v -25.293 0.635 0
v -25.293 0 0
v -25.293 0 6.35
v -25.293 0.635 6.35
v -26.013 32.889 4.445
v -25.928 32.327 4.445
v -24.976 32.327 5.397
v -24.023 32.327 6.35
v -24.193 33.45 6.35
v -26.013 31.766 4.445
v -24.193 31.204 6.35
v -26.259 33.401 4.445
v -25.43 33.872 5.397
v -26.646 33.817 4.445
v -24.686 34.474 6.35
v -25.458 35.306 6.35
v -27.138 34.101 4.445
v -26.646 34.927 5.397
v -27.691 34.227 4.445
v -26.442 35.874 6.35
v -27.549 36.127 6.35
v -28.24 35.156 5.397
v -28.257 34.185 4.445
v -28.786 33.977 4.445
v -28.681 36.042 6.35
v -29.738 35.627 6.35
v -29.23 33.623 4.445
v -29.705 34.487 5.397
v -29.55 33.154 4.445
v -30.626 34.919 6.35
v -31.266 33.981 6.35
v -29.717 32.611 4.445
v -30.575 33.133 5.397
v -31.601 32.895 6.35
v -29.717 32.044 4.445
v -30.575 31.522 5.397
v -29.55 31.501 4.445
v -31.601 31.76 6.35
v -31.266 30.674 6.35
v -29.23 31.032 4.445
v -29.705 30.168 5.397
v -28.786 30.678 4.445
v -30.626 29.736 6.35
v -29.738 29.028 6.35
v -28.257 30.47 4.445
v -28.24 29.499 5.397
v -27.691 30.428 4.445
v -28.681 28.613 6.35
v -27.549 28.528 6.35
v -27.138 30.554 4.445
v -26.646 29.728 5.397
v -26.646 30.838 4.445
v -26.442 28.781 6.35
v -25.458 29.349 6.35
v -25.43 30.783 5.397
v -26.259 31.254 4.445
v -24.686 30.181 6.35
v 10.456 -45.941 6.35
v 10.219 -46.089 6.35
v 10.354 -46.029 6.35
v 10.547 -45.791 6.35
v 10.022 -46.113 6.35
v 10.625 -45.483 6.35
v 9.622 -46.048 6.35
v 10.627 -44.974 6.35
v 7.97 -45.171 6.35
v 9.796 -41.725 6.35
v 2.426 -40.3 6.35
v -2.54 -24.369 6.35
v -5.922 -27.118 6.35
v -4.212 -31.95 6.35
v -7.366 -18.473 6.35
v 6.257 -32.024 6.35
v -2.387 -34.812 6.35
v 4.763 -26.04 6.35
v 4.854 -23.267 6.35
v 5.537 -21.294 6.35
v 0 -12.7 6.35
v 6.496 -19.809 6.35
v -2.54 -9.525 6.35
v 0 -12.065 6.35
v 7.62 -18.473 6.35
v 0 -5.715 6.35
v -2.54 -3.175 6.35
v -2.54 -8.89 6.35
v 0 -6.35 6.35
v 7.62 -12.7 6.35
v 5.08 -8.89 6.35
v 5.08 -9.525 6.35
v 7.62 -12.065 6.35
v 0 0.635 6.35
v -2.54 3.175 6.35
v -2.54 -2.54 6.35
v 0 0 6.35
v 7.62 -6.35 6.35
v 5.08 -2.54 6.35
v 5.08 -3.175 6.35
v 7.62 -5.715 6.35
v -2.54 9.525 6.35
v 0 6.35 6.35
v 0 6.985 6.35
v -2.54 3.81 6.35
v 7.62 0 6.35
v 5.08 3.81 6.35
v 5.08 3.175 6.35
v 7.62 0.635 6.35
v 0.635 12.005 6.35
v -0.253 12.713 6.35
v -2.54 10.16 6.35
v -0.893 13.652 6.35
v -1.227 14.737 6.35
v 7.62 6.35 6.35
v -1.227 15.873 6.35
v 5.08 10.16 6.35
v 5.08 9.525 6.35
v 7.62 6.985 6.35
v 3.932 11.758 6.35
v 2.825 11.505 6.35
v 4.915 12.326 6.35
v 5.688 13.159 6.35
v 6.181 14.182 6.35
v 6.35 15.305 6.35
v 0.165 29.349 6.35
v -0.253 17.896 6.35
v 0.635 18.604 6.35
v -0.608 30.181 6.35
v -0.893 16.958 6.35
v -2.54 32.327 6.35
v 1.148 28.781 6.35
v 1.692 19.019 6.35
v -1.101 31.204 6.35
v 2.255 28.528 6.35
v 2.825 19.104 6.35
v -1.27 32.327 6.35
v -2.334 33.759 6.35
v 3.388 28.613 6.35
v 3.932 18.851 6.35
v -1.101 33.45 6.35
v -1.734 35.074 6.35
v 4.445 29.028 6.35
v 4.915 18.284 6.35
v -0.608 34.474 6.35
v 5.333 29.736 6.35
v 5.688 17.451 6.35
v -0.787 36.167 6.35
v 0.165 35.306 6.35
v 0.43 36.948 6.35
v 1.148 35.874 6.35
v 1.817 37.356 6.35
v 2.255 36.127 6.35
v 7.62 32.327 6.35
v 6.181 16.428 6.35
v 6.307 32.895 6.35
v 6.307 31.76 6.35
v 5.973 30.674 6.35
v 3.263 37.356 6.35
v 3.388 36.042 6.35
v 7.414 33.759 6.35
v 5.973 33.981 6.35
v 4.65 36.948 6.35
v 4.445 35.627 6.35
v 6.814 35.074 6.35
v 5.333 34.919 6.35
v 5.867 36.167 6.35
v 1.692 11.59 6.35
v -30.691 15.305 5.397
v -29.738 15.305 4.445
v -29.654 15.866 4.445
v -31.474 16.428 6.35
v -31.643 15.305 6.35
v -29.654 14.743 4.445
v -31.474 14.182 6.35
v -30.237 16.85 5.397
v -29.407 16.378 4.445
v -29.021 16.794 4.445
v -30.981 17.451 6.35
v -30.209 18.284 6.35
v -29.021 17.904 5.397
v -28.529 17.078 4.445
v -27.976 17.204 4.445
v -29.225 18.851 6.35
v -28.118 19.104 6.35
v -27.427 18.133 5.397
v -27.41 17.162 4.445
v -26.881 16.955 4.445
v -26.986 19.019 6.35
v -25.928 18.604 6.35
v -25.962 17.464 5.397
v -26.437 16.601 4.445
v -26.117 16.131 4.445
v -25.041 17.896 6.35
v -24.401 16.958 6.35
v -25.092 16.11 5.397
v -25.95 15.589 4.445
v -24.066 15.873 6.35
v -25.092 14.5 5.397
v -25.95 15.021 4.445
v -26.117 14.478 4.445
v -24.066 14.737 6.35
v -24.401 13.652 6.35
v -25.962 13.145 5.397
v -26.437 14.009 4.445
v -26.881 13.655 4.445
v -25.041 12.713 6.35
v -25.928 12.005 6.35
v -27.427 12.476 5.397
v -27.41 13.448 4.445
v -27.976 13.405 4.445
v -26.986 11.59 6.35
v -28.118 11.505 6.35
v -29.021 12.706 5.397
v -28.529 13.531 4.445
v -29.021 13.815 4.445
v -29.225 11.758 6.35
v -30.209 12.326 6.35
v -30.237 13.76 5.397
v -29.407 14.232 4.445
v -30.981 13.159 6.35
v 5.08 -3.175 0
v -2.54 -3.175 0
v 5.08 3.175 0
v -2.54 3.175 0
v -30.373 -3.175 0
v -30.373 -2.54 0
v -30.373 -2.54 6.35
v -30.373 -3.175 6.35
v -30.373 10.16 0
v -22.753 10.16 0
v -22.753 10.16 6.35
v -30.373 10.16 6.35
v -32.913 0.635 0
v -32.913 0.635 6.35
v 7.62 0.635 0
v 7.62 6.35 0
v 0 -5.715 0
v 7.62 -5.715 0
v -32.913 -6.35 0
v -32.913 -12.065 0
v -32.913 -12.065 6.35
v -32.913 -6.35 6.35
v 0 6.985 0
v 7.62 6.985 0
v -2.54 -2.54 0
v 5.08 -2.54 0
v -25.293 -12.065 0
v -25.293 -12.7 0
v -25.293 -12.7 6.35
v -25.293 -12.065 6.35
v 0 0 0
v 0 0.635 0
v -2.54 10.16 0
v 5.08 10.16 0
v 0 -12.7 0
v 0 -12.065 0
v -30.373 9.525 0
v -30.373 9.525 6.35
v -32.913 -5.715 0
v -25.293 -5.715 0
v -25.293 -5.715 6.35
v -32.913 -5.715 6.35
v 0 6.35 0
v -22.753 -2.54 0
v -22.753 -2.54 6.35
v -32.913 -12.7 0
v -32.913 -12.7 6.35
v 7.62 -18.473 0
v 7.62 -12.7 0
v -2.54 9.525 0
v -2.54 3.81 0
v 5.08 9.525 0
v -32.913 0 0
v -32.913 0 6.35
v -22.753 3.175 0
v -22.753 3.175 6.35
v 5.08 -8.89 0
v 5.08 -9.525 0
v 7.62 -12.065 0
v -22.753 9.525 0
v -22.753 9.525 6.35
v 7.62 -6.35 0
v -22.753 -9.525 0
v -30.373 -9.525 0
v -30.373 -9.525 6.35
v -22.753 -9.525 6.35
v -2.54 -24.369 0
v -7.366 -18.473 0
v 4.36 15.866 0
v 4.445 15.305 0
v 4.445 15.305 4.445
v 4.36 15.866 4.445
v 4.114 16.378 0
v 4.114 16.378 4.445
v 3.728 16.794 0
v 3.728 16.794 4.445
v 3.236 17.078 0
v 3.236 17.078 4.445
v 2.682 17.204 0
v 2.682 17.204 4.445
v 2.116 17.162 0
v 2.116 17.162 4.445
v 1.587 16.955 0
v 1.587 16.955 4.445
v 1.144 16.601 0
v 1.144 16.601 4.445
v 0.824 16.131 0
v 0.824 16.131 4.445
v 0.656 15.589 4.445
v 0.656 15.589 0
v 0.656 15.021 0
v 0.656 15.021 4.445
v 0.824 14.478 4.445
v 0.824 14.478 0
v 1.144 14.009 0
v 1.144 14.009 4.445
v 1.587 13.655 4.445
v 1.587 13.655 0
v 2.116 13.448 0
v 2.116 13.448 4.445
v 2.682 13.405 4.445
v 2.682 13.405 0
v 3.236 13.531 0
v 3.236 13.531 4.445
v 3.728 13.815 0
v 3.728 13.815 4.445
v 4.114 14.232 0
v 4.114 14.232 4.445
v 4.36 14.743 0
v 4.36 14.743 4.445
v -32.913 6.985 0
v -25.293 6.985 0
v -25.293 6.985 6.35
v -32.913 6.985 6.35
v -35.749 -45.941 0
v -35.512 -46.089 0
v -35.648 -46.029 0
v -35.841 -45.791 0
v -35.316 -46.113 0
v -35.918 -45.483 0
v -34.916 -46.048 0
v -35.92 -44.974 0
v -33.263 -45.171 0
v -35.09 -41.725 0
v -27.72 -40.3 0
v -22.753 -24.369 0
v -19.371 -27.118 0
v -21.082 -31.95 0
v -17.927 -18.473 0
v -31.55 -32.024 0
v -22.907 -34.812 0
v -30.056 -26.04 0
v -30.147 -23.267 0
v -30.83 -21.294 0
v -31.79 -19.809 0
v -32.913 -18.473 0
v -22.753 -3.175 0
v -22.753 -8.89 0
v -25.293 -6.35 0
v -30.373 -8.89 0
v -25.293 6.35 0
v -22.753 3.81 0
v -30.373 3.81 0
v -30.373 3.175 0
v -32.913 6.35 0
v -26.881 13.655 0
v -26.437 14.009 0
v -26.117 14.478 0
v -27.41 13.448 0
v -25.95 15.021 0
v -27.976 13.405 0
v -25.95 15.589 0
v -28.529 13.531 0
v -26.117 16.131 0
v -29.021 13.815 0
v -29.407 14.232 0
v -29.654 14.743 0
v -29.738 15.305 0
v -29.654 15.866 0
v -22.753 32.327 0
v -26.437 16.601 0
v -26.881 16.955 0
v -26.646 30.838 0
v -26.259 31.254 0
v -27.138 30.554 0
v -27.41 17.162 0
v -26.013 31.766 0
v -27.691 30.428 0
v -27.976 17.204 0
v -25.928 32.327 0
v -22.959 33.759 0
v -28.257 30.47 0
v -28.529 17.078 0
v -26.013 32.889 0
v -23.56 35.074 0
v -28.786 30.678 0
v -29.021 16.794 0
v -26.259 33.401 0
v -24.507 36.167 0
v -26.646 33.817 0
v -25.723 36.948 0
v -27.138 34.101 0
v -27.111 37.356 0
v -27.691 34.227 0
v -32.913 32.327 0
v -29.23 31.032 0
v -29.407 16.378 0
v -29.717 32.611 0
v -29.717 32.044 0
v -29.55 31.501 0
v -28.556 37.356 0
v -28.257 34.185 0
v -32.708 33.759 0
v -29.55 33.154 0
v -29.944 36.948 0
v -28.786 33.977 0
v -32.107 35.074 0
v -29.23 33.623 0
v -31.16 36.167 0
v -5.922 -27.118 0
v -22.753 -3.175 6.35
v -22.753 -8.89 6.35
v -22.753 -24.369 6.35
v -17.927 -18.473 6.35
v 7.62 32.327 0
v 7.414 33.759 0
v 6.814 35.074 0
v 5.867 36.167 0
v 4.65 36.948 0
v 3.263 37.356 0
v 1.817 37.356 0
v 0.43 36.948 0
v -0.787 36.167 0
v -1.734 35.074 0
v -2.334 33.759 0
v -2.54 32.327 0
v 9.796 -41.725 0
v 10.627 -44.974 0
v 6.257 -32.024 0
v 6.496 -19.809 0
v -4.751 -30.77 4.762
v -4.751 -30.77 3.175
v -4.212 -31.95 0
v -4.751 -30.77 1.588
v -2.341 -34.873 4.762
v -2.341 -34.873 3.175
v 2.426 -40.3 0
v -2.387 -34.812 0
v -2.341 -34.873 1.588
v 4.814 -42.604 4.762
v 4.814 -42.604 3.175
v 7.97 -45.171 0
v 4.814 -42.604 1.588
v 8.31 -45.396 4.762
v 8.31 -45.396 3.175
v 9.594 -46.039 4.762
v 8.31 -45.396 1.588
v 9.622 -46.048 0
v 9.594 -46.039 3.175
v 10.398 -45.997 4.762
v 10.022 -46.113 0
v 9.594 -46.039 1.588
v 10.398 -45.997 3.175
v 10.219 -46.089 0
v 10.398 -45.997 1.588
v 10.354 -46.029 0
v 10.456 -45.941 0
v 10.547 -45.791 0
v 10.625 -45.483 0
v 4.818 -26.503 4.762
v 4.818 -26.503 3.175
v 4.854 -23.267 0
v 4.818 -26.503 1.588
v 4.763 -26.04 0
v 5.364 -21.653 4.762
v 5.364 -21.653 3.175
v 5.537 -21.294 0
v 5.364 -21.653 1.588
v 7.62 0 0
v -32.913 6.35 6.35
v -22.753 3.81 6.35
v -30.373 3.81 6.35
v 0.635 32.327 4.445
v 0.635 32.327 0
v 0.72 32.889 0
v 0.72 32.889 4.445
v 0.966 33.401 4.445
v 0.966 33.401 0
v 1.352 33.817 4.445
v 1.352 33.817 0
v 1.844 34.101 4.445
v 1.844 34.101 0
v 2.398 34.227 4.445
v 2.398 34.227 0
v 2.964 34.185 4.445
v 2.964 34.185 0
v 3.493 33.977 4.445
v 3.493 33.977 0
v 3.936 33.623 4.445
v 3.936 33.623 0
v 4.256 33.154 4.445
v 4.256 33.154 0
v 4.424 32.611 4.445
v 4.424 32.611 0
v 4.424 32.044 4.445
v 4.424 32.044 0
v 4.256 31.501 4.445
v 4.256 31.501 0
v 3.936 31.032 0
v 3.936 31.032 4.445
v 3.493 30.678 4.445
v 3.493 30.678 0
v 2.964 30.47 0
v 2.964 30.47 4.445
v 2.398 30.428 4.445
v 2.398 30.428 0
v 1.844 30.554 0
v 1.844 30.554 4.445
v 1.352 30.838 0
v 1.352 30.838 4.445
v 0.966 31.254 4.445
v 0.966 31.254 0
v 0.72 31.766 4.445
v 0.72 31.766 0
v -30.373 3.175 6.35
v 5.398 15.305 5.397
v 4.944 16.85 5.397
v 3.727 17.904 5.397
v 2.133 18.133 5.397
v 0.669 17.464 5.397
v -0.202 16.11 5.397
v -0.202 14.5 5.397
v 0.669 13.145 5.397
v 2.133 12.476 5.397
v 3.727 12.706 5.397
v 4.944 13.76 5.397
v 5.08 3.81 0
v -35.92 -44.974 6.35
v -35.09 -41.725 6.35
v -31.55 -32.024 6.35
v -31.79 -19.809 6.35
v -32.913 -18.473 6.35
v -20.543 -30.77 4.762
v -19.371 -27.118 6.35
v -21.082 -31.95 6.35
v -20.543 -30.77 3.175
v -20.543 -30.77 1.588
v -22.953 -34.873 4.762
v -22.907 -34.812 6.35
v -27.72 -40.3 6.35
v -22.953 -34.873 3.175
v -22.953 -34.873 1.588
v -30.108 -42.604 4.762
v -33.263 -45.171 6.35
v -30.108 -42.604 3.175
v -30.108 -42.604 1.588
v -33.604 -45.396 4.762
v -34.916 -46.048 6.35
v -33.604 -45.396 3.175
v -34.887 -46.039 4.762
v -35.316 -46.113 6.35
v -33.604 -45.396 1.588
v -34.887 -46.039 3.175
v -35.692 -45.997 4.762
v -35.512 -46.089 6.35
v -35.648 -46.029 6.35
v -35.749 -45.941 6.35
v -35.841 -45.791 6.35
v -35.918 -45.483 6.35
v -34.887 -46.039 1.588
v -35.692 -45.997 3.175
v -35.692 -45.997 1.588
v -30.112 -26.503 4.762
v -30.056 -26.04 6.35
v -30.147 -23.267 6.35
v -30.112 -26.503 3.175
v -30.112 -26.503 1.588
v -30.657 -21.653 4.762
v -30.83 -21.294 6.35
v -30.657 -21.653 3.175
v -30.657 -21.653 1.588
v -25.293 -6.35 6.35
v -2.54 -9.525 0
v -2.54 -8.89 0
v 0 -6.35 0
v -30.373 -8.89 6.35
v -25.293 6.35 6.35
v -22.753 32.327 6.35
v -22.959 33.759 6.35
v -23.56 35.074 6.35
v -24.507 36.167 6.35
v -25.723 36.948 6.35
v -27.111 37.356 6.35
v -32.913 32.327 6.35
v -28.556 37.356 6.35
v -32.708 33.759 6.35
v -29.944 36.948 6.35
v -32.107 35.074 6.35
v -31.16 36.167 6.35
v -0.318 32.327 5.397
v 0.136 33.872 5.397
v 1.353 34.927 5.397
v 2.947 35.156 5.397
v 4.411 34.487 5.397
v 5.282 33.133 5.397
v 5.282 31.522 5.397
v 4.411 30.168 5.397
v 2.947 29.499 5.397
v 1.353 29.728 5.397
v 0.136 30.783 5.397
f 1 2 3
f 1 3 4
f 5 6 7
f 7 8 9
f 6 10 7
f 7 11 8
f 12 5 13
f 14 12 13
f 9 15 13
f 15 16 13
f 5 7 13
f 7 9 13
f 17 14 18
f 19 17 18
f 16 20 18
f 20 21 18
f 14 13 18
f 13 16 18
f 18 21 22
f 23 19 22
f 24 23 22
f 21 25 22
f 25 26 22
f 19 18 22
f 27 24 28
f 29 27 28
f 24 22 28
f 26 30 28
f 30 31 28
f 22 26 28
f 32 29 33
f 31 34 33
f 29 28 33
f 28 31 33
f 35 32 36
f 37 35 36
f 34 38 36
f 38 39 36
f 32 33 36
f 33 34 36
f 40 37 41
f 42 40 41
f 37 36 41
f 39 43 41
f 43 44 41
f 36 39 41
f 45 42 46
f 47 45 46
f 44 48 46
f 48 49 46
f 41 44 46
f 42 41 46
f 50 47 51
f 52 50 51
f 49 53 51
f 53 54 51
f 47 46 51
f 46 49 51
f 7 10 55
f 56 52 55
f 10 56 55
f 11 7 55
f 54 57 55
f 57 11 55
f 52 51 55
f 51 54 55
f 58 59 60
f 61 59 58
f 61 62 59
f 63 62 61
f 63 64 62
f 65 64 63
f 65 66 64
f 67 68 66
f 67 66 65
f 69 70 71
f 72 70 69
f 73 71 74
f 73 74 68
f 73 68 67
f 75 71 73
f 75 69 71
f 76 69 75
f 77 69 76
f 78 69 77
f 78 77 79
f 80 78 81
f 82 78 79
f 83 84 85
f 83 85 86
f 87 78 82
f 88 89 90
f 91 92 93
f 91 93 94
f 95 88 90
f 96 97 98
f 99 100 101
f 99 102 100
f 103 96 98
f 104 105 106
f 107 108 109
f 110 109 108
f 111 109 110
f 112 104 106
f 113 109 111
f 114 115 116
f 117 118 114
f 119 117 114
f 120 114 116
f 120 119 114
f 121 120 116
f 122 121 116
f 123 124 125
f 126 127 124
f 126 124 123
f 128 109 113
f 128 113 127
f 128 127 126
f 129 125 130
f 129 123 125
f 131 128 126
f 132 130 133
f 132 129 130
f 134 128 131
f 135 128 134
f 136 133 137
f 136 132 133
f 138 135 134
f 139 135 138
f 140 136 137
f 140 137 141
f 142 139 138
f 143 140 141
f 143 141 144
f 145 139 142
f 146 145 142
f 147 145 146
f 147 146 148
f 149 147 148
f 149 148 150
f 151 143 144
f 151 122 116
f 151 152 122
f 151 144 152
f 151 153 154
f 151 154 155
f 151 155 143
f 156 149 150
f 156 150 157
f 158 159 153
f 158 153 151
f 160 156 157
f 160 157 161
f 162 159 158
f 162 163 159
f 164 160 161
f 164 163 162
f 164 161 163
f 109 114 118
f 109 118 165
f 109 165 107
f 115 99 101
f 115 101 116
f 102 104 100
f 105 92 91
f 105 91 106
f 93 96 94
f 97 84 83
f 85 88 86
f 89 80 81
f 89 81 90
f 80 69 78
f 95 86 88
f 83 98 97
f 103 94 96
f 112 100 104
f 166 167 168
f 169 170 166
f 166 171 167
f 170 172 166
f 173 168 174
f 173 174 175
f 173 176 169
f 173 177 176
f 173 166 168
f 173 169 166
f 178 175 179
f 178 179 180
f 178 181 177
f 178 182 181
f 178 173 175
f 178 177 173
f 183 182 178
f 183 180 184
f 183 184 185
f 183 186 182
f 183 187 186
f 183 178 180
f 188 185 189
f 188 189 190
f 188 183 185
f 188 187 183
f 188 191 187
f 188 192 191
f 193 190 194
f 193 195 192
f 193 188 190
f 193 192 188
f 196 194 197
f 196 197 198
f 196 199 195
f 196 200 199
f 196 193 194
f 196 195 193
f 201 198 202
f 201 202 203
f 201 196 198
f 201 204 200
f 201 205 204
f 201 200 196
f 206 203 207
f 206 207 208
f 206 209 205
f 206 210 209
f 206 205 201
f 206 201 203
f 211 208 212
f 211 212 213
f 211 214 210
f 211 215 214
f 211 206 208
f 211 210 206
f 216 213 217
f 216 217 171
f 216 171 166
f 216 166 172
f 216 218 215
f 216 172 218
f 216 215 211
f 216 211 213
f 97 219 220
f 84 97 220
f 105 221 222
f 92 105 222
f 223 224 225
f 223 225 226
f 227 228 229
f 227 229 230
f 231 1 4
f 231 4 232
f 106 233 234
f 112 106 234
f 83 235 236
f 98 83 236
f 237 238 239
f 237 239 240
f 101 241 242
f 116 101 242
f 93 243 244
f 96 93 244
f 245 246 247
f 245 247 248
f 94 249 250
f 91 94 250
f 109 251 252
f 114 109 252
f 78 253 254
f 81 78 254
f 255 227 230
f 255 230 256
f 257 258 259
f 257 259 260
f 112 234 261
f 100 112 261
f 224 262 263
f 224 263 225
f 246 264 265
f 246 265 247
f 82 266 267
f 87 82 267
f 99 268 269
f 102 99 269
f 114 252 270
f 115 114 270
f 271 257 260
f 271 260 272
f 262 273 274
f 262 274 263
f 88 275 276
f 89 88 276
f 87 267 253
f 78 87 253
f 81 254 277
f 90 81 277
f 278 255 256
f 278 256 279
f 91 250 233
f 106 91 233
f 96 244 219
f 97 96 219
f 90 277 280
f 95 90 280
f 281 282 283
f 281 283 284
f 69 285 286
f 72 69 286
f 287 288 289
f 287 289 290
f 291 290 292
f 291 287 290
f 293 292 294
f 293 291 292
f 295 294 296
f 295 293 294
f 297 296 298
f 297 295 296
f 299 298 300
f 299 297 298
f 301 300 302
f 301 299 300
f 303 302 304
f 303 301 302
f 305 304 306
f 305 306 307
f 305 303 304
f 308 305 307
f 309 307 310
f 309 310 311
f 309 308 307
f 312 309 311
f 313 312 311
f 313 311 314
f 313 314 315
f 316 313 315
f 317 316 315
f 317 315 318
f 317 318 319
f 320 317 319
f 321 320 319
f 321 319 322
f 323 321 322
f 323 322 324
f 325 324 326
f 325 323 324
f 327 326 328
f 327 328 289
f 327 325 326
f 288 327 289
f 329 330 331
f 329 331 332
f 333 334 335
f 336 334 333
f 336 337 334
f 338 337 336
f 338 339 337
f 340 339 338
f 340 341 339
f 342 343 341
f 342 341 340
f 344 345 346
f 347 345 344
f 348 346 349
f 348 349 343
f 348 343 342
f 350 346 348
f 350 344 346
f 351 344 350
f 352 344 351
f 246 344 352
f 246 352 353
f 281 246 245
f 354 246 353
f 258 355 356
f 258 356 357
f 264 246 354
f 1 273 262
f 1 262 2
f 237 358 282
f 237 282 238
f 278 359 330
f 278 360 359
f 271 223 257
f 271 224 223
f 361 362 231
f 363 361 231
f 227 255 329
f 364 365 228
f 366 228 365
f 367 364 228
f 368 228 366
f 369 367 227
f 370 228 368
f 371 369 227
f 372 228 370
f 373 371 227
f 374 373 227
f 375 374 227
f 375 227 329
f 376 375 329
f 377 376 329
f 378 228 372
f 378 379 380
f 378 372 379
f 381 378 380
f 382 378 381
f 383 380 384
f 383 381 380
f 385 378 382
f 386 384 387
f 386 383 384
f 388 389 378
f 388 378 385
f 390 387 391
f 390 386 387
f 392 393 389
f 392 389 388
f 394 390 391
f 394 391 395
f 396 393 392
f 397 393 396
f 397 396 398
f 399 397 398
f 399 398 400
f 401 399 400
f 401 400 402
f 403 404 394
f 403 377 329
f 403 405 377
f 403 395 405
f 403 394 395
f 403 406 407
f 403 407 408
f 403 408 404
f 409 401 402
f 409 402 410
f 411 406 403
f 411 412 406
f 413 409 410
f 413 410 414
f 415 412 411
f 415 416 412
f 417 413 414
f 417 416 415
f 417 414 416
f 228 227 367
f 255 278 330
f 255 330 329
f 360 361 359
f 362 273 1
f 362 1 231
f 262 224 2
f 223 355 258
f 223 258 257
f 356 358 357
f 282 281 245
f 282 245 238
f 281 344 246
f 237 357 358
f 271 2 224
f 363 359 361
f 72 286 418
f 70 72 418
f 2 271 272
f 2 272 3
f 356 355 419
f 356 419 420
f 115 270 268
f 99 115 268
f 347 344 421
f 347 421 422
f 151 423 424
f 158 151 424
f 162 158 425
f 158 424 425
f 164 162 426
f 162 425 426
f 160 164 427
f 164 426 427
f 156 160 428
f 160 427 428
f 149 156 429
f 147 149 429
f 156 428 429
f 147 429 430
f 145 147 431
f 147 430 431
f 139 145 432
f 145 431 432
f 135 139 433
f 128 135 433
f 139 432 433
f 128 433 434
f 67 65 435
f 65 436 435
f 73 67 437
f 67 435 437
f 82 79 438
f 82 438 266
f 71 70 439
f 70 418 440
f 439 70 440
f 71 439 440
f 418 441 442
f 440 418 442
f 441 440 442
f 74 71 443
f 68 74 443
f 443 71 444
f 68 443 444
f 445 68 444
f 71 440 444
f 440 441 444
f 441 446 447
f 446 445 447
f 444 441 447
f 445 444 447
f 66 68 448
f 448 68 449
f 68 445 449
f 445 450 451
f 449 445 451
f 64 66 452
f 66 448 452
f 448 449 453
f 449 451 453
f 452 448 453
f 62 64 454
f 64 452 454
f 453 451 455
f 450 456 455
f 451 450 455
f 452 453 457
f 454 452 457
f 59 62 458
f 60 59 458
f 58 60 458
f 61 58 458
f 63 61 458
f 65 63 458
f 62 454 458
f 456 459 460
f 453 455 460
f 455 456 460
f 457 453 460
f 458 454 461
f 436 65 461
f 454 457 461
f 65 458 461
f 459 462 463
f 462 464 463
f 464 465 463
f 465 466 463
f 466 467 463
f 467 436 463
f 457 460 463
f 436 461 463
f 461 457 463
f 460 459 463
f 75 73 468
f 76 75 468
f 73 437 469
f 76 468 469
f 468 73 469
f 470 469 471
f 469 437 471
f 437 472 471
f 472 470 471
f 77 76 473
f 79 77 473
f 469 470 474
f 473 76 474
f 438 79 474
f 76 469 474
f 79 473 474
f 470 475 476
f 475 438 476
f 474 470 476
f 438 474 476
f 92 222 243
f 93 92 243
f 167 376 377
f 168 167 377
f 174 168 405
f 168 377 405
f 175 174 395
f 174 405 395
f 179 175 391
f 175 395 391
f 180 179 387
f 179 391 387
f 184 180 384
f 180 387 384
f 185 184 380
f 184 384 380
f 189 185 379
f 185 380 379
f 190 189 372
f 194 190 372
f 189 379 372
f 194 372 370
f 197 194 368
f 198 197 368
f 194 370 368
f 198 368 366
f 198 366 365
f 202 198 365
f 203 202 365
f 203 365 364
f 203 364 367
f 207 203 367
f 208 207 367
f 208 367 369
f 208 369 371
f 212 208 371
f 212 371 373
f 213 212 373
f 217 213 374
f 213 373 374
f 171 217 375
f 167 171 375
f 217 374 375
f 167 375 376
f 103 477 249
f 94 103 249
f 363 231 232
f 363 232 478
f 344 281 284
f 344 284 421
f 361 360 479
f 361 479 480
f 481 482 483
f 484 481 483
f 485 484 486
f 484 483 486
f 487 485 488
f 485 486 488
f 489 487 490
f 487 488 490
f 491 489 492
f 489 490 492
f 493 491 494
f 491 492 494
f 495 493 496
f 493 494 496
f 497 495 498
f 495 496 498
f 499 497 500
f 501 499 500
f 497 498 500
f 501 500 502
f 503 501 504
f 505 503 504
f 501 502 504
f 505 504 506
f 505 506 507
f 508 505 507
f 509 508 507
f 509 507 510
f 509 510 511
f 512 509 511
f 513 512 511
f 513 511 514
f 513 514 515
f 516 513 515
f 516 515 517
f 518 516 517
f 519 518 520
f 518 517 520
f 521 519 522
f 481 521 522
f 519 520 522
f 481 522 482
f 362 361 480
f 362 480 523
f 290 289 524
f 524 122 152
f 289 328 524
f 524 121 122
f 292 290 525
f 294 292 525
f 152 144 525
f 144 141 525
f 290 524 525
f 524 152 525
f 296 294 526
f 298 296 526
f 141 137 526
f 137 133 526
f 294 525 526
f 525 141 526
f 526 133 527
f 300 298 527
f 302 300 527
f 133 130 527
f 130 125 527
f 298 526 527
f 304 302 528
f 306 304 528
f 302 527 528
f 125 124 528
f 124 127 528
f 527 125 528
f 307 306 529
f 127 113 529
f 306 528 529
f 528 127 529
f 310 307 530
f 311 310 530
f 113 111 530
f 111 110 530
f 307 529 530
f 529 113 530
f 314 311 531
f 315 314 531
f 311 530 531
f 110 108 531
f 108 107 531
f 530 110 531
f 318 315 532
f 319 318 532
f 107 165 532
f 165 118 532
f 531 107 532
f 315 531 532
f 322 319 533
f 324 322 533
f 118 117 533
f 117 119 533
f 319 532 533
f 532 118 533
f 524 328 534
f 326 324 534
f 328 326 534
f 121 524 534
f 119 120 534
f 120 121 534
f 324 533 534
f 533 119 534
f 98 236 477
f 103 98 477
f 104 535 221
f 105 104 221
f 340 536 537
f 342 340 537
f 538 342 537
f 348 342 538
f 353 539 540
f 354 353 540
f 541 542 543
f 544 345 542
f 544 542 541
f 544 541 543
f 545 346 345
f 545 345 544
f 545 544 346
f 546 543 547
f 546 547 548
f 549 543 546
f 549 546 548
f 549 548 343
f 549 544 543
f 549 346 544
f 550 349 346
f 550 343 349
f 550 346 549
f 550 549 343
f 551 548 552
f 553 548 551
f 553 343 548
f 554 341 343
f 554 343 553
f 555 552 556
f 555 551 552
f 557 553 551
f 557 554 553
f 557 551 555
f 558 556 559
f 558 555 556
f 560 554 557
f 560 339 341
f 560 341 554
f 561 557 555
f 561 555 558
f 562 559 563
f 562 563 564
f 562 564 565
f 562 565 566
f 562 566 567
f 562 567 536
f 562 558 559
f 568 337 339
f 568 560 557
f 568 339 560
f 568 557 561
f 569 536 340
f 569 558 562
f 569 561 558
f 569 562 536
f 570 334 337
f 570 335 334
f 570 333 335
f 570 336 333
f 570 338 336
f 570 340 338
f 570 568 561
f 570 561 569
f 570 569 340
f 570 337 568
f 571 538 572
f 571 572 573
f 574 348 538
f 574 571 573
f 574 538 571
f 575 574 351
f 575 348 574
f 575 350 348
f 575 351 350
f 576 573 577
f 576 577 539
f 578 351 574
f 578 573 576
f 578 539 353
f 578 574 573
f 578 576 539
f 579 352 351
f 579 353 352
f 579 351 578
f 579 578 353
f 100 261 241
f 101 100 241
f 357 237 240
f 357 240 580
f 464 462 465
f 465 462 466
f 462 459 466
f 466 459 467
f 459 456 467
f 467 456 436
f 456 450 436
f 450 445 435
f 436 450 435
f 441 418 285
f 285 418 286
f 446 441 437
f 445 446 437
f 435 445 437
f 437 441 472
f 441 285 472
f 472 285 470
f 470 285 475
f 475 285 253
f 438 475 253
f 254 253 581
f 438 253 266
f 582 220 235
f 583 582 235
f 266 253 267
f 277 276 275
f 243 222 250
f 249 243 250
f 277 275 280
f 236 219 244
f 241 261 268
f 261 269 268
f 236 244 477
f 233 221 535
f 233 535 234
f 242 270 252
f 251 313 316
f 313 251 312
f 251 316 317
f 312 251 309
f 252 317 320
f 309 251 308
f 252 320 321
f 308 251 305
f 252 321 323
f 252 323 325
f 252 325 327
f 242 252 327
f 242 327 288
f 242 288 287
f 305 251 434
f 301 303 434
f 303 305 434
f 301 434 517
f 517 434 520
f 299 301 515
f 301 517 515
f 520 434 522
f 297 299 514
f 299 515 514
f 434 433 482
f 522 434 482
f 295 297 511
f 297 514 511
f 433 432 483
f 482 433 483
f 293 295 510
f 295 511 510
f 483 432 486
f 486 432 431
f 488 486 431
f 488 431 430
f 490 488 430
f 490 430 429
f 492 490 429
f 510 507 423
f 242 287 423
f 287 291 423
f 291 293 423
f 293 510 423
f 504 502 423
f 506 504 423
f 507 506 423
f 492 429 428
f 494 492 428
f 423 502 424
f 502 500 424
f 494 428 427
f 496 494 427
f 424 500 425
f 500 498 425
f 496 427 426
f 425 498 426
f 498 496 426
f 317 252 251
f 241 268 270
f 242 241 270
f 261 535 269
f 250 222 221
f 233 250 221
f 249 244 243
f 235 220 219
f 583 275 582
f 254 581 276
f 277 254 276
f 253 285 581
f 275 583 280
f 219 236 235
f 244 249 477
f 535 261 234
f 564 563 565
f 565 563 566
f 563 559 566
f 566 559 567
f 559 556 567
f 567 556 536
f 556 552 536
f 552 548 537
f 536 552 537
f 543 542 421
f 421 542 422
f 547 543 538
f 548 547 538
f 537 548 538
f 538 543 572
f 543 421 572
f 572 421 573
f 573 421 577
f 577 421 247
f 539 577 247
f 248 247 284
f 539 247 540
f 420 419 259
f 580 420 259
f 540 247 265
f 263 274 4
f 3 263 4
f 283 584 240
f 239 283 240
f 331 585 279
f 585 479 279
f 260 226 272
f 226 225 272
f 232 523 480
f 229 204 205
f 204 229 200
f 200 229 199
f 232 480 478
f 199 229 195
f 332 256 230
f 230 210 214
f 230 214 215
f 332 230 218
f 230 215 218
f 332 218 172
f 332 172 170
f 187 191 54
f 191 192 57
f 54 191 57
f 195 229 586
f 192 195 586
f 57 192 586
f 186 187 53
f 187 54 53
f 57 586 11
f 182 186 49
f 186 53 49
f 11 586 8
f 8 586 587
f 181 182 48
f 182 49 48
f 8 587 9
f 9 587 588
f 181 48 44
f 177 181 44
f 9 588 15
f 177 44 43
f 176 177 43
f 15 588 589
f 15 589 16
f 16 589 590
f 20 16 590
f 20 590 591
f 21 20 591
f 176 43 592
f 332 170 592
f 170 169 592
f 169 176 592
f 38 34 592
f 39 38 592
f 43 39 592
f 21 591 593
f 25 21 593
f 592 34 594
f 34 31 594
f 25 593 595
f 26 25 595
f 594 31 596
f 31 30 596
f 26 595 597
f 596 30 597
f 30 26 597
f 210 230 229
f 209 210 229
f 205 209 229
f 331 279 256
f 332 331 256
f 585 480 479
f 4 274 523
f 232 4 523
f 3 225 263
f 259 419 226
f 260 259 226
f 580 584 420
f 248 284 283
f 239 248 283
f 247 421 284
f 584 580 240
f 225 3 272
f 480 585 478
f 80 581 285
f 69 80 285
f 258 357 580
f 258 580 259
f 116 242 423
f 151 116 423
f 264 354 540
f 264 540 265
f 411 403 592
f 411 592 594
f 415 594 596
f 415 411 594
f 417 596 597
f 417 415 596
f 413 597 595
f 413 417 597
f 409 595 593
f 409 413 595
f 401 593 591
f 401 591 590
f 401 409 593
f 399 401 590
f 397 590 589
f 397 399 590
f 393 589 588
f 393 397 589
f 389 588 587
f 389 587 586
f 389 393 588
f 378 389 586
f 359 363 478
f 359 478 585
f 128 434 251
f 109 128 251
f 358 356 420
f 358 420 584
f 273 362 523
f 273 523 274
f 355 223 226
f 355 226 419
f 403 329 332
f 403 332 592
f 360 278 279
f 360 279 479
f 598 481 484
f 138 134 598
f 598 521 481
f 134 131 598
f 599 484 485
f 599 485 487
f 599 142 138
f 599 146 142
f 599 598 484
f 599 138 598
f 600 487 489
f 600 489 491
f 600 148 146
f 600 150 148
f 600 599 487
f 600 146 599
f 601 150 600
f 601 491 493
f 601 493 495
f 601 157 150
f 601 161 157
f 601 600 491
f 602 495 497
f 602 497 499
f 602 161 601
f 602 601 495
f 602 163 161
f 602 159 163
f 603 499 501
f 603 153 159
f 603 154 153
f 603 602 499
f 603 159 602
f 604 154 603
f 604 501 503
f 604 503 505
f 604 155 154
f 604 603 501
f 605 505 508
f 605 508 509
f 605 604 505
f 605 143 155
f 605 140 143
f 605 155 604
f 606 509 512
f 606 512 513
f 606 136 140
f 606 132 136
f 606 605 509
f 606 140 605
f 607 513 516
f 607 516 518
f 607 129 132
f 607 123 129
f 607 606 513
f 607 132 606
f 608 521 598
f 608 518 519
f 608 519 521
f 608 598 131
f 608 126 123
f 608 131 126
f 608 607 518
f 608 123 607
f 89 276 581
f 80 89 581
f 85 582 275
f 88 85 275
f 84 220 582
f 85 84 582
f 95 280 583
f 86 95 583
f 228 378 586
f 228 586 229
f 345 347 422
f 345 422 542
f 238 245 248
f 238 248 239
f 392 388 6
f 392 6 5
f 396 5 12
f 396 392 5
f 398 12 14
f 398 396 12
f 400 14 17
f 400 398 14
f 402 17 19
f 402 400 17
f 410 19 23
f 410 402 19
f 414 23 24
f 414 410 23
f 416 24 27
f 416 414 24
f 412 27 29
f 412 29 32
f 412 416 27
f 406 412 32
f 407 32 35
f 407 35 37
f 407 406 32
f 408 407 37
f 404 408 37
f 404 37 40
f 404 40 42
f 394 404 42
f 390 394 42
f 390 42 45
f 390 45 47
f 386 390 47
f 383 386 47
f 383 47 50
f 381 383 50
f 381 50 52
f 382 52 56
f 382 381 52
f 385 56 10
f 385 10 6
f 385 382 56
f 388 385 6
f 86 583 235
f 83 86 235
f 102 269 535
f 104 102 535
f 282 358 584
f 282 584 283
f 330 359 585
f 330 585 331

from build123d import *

# Parameters (mm, degrees)
F0_R     = 1.905
F1_DEPTH = 6.35
F2_SIZE  = 1.905


# Not quite as in the source:
# - a feature names something its author has since deleted; it is built from what else it names


with BuildPart() as f1:
    # F0 (on Top) → F1 (new body)
    with BuildSketch(Plane.XY):
        with BuildLine():
            Line((0.635, 32.3274787827), (-2.54, 32.3274787827))
            ThreePointArc((-2.54, 32.3274787827), (2.54, 27.2474787827), (7.62, 32.3274787827))
            Line((7.62, 32.3274787827), (4.445, 32.3274787827))
            ThreePointArc((4.445, 32.3274787827), (2.54, 30.4224787827), (0.635, 32.3274787827))
        make_face()
        with BuildLine():
            ThreePointArc((7.62, 32.3274787827), (2.54, 37.4074787827), (-2.54, 32.3274787827))
            Line((-2.54, 32.3274787827), (0.635, 32.3274787827))
            ThreePointArc((0.635, 32.3274787827), (2.54, 34.2324787827), (4.445, 32.3274787827))
            Line((4.445, 32.3274787827), (7.62, 32.3274787827))
        make_face()
        with BuildLine():
            Line((-2.54, -9.525), (-2.54, -18.4725212173))
            Line((-2.54, -18.4725212173), (-2.54, -24.3690894357))
            Line((-2.54, -24.3690894357), (-7.3664773123, -18.4725212173))
            Line((-7.3664773123, -18.4725212173), (-5.9221661487, -27.1184083573))
            add(Edge.make_bspline(
                [(-5.9221661487, -27.1184083573), (-5.0940429792, -29.8072900623), (-4.4350836246, -34.076325633), (17.6067707768, -55.5132531587), (1.6726871659, -25.297889833), (5.911566797, -20.4156751081), (7.62, -18.4725212173)],
                knots=[0, 0, 0, 0, 0.2021996559, 0.4867073763, 0.7982350217, 1, 1, 1, 1], degree=3))
            Line((7.62, -18.4725212173), (7.62, -12.7))
            Line((7.62, -12.7), (0, -12.7))
            Line((0, -12.7), (0, -12.065))
            Line((0, -12.065), (7.62, -12.065))
            Line((7.62, -12.065), (7.62, -6.35))
            Line((7.62, -6.35), (0, -6.35))
            Line((0, -6.35), (0, -5.715))
            Line((0, -5.715), (7.62, -5.715))
            Line((7.62, -5.715), (7.62, 0))
            Line((7.62, 0), (0, 0))
            Line((0, 0), (0, 0.635))
            Line((0, 0.635), (7.62, 0.635))
            Line((7.62, 0.635), (7.62, 6.35))
            Line((7.62, 6.35), (0, 6.35))
            Line((0, 6.35), (0, 6.985))
            Line((0, 6.985), (5.9817770534, 6.985))
            Line((5.9817770534, 6.985), (7.62, 6.985))
            Line((7.62, 6.985), (7.62, 9.525))
            Line((7.62, 9.525), (7.62, 32.3274787827))
            ThreePointArc((7.62, 32.3274787827), (2.54, 27.2474787827), (-2.54, 32.3274787827))
            Line((-2.54, 32.3274787827), (-2.54, 19.6274787827))
            Line((-2.54, 19.6274787827), (-2.54, 10.16))
            Line((-2.54, 10.16), (5.08, 10.16))
            Line((5.08, 10.16), (5.08, 9.525))
            Line((5.08, 9.525), (-2.54, 9.525))
            Line((-2.54, 9.525), (-2.54, 3.81))
            Line((-2.54, 3.81), (5.08, 3.81))
            Line((5.08, 3.81), (5.08, 3.175))
            Line((5.08, 3.175), (-2.54, 3.175))
            Line((-2.54, 3.175), (-2.54, -2.54))
            Line((-2.54, -2.54), (5.08, -2.54))
            Line((5.08, -2.54), (5.08, -3.175))
            Line((5.08, -3.175), (-2.54, -3.175))
            Line((-2.54, -3.175), (-2.54, -8.89))
            Line((-2.54, -8.89), (5.08, -8.89))
            Line((5.08, -8.89), (5.08, -9.525))
            Line((5.08, -9.525), (-2.54, -9.525))
        make_face()
        with Locations((2.54, 15.3047889471)):
            Circle(F0_R, mode=Mode.SUBTRACT)
    extrude(amount=F1_DEPTH)

    # F2
    f2_edges = [f1.edges().sort_by_distance(p)[0] for p in [
        (0.635, 15.304789, 6.35),
        (4.445, 32.327479, 6.35),
    ]]
    chamfer(f2_edges, length=F2_SIZE)


with BuildPart() as f5_1:
    # F5: instance of F1
    add(f1.part.mirror(Plane(origin=(-12.6467412338, 13.2919847965, 12.7), x_dir=(0, 1, 0), z_dir=(1, 0, 0))))


solid = Compound([f1.part, f5_1.part])
